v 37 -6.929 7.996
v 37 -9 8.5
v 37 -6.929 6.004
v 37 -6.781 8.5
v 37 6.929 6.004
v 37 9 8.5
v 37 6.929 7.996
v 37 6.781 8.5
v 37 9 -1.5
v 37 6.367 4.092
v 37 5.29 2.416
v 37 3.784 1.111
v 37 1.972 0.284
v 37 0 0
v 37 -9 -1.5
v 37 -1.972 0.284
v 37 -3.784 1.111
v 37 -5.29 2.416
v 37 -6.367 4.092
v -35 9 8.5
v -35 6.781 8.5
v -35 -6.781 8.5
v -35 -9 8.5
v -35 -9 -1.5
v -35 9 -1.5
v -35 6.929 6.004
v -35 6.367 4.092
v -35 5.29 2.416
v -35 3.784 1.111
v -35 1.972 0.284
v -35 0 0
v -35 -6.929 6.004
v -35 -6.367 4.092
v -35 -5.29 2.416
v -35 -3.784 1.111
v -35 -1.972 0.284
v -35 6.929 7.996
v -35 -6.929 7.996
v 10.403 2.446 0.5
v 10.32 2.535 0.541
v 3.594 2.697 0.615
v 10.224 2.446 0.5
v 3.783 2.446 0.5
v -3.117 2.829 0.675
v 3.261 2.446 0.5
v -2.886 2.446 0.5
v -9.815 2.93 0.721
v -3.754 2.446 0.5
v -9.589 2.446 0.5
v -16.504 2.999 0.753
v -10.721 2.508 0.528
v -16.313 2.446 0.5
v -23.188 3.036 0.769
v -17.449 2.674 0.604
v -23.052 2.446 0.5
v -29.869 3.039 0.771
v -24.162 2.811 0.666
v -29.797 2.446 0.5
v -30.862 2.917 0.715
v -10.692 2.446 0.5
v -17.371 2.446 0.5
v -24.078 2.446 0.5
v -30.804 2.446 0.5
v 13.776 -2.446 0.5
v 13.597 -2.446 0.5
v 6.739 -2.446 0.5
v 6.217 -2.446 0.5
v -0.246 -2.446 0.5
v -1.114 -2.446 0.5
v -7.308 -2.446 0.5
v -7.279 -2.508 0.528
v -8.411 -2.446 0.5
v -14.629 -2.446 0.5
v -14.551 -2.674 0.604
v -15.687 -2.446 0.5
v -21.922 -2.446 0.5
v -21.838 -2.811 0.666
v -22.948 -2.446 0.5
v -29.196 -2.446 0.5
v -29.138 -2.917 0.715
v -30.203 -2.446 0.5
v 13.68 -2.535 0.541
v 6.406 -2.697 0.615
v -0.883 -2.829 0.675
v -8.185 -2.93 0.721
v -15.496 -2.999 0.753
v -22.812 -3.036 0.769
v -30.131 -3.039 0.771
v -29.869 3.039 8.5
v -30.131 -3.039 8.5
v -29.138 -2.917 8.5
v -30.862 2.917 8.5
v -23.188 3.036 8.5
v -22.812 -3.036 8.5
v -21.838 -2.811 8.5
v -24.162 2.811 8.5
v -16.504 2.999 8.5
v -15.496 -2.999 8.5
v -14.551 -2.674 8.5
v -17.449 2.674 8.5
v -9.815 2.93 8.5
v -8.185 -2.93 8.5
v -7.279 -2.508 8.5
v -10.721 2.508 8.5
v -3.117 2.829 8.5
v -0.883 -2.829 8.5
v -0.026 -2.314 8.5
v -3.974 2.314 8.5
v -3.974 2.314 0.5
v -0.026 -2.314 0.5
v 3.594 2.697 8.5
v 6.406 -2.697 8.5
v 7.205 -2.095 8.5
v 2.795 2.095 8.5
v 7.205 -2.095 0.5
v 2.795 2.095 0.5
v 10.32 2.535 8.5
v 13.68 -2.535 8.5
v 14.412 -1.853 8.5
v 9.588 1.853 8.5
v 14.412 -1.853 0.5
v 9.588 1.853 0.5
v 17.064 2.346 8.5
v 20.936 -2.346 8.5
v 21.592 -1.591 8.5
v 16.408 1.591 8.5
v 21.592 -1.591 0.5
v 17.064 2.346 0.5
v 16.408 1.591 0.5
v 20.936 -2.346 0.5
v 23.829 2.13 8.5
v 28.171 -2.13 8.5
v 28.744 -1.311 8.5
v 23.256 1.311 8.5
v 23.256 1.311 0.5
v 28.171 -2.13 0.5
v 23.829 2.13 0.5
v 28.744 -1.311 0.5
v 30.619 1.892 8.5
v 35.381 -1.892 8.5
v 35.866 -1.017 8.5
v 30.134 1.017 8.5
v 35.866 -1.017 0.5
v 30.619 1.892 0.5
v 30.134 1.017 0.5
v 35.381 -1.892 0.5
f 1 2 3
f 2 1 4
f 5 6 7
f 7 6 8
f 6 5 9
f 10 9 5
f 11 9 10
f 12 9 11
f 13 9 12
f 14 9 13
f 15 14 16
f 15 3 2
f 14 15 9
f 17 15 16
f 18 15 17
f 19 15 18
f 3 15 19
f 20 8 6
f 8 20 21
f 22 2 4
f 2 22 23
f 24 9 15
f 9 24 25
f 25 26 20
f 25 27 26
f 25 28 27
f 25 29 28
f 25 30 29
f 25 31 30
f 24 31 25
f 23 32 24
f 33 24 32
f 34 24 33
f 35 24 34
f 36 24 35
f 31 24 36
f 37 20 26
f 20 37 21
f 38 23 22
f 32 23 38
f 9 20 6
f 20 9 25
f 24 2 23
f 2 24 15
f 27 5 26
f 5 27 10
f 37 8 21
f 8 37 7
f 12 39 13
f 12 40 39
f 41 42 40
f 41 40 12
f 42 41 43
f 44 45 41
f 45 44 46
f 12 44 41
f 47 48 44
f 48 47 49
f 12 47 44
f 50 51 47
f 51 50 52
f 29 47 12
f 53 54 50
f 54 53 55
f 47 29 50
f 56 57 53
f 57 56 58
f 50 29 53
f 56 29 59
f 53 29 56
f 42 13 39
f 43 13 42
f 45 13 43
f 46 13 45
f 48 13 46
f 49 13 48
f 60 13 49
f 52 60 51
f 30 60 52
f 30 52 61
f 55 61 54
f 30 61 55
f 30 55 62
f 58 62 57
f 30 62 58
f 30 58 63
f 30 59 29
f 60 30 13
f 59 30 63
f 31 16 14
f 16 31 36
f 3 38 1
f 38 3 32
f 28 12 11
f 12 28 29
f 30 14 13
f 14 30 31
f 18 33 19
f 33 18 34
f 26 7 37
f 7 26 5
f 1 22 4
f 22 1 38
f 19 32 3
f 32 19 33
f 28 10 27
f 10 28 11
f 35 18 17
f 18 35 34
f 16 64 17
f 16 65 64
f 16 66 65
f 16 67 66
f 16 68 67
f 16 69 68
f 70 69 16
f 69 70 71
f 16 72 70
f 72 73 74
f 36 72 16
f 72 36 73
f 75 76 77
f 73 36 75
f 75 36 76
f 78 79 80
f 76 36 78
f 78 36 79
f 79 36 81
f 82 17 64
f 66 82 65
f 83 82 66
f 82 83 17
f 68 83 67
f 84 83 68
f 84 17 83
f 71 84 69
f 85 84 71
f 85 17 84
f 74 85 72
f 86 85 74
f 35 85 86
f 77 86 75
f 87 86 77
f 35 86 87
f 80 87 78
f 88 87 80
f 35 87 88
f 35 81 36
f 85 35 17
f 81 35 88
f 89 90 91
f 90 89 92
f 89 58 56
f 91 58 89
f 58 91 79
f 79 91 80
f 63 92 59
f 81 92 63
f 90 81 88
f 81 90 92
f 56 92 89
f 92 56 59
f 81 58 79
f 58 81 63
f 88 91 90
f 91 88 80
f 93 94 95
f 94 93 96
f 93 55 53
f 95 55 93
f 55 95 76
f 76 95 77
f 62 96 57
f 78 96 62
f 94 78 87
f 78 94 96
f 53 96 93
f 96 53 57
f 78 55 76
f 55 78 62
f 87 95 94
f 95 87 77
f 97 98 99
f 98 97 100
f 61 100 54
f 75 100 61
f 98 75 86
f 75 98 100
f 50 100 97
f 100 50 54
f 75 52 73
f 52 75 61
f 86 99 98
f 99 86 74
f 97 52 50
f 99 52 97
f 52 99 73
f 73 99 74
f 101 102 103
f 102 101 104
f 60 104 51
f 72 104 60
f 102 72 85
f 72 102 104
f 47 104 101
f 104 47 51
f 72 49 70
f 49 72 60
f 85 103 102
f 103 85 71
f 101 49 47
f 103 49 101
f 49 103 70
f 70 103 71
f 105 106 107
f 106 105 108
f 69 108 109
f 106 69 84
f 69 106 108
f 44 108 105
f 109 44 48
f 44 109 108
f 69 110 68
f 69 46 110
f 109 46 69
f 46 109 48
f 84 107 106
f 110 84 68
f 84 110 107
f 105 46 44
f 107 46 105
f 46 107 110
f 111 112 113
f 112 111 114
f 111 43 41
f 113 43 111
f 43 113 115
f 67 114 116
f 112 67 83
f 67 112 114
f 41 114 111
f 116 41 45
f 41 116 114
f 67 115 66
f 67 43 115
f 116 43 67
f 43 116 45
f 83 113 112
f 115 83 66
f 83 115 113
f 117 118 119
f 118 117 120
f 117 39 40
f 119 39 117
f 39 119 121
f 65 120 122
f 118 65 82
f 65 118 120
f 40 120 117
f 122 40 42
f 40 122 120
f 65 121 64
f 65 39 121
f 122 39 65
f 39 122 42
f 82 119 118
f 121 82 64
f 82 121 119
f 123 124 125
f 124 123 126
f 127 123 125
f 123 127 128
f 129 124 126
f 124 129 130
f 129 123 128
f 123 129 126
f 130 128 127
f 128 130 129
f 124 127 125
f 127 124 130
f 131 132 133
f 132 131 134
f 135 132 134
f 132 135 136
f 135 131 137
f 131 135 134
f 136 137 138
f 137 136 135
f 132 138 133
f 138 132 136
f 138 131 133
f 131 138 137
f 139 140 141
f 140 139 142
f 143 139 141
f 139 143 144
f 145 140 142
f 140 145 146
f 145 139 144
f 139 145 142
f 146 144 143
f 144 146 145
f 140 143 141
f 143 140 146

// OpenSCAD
scale(1) translate([-35,0,0]) union() {
translate([36,0,0]) difference() {
translate([0,0,3.5]) cube([72,18,10],center=true); 
translate([-36.25,0,7]) rotate([0,90,0]) cylinder(72.5,7,7,center=false); 
}
union() {
union() {
union() {
union() {
union() {
union() {
union() {
union() {
union() {
union() {
translate([5,0,0]) rotate([0,0,7]) translate([0,0,4.5]) cube([1,6,8],center=true); 
}
translate([12,0,0]) rotate([0,0,13]) translate([0,0,4.5]) cube([1,6,8],center=true); 
}
translate([19,0,0]) rotate([0,0,19]) translate([0,0,4.5]) cube([1,6,8],center=true); 
}
translate([26,0,0]) rotate([0,0,25]) translate([0,0,4.5]) cube([1,6,8],center=true); 
}
translate([33,0,0]) rotate([0,0,31]) translate([0,0,4.5]) cube([1,6,8],center=true); 
}
translate([40,0,0]) rotate([0,0,37]) translate([0,0,4.5]) cube([1,6,8],center=true); 
}
translate([47,0,0]) rotate([0,0,43]) translate([0,0,4.5]) cube([1,6,8],center=true); 
}
translate([54,0,0]) rotate([0,0,49]) translate([0,0,4.5]) cube([1,6,8],center=true); 
}
translate([61,0,0]) rotate([0,0,55]) translate([0,0,4.5]) cube([1,6,8],center=true); 
}
translate([68,0,0]) rotate([0,0,61]) translate([0,0,4.5]) cube([1,6,8],center=true); 
}
}
